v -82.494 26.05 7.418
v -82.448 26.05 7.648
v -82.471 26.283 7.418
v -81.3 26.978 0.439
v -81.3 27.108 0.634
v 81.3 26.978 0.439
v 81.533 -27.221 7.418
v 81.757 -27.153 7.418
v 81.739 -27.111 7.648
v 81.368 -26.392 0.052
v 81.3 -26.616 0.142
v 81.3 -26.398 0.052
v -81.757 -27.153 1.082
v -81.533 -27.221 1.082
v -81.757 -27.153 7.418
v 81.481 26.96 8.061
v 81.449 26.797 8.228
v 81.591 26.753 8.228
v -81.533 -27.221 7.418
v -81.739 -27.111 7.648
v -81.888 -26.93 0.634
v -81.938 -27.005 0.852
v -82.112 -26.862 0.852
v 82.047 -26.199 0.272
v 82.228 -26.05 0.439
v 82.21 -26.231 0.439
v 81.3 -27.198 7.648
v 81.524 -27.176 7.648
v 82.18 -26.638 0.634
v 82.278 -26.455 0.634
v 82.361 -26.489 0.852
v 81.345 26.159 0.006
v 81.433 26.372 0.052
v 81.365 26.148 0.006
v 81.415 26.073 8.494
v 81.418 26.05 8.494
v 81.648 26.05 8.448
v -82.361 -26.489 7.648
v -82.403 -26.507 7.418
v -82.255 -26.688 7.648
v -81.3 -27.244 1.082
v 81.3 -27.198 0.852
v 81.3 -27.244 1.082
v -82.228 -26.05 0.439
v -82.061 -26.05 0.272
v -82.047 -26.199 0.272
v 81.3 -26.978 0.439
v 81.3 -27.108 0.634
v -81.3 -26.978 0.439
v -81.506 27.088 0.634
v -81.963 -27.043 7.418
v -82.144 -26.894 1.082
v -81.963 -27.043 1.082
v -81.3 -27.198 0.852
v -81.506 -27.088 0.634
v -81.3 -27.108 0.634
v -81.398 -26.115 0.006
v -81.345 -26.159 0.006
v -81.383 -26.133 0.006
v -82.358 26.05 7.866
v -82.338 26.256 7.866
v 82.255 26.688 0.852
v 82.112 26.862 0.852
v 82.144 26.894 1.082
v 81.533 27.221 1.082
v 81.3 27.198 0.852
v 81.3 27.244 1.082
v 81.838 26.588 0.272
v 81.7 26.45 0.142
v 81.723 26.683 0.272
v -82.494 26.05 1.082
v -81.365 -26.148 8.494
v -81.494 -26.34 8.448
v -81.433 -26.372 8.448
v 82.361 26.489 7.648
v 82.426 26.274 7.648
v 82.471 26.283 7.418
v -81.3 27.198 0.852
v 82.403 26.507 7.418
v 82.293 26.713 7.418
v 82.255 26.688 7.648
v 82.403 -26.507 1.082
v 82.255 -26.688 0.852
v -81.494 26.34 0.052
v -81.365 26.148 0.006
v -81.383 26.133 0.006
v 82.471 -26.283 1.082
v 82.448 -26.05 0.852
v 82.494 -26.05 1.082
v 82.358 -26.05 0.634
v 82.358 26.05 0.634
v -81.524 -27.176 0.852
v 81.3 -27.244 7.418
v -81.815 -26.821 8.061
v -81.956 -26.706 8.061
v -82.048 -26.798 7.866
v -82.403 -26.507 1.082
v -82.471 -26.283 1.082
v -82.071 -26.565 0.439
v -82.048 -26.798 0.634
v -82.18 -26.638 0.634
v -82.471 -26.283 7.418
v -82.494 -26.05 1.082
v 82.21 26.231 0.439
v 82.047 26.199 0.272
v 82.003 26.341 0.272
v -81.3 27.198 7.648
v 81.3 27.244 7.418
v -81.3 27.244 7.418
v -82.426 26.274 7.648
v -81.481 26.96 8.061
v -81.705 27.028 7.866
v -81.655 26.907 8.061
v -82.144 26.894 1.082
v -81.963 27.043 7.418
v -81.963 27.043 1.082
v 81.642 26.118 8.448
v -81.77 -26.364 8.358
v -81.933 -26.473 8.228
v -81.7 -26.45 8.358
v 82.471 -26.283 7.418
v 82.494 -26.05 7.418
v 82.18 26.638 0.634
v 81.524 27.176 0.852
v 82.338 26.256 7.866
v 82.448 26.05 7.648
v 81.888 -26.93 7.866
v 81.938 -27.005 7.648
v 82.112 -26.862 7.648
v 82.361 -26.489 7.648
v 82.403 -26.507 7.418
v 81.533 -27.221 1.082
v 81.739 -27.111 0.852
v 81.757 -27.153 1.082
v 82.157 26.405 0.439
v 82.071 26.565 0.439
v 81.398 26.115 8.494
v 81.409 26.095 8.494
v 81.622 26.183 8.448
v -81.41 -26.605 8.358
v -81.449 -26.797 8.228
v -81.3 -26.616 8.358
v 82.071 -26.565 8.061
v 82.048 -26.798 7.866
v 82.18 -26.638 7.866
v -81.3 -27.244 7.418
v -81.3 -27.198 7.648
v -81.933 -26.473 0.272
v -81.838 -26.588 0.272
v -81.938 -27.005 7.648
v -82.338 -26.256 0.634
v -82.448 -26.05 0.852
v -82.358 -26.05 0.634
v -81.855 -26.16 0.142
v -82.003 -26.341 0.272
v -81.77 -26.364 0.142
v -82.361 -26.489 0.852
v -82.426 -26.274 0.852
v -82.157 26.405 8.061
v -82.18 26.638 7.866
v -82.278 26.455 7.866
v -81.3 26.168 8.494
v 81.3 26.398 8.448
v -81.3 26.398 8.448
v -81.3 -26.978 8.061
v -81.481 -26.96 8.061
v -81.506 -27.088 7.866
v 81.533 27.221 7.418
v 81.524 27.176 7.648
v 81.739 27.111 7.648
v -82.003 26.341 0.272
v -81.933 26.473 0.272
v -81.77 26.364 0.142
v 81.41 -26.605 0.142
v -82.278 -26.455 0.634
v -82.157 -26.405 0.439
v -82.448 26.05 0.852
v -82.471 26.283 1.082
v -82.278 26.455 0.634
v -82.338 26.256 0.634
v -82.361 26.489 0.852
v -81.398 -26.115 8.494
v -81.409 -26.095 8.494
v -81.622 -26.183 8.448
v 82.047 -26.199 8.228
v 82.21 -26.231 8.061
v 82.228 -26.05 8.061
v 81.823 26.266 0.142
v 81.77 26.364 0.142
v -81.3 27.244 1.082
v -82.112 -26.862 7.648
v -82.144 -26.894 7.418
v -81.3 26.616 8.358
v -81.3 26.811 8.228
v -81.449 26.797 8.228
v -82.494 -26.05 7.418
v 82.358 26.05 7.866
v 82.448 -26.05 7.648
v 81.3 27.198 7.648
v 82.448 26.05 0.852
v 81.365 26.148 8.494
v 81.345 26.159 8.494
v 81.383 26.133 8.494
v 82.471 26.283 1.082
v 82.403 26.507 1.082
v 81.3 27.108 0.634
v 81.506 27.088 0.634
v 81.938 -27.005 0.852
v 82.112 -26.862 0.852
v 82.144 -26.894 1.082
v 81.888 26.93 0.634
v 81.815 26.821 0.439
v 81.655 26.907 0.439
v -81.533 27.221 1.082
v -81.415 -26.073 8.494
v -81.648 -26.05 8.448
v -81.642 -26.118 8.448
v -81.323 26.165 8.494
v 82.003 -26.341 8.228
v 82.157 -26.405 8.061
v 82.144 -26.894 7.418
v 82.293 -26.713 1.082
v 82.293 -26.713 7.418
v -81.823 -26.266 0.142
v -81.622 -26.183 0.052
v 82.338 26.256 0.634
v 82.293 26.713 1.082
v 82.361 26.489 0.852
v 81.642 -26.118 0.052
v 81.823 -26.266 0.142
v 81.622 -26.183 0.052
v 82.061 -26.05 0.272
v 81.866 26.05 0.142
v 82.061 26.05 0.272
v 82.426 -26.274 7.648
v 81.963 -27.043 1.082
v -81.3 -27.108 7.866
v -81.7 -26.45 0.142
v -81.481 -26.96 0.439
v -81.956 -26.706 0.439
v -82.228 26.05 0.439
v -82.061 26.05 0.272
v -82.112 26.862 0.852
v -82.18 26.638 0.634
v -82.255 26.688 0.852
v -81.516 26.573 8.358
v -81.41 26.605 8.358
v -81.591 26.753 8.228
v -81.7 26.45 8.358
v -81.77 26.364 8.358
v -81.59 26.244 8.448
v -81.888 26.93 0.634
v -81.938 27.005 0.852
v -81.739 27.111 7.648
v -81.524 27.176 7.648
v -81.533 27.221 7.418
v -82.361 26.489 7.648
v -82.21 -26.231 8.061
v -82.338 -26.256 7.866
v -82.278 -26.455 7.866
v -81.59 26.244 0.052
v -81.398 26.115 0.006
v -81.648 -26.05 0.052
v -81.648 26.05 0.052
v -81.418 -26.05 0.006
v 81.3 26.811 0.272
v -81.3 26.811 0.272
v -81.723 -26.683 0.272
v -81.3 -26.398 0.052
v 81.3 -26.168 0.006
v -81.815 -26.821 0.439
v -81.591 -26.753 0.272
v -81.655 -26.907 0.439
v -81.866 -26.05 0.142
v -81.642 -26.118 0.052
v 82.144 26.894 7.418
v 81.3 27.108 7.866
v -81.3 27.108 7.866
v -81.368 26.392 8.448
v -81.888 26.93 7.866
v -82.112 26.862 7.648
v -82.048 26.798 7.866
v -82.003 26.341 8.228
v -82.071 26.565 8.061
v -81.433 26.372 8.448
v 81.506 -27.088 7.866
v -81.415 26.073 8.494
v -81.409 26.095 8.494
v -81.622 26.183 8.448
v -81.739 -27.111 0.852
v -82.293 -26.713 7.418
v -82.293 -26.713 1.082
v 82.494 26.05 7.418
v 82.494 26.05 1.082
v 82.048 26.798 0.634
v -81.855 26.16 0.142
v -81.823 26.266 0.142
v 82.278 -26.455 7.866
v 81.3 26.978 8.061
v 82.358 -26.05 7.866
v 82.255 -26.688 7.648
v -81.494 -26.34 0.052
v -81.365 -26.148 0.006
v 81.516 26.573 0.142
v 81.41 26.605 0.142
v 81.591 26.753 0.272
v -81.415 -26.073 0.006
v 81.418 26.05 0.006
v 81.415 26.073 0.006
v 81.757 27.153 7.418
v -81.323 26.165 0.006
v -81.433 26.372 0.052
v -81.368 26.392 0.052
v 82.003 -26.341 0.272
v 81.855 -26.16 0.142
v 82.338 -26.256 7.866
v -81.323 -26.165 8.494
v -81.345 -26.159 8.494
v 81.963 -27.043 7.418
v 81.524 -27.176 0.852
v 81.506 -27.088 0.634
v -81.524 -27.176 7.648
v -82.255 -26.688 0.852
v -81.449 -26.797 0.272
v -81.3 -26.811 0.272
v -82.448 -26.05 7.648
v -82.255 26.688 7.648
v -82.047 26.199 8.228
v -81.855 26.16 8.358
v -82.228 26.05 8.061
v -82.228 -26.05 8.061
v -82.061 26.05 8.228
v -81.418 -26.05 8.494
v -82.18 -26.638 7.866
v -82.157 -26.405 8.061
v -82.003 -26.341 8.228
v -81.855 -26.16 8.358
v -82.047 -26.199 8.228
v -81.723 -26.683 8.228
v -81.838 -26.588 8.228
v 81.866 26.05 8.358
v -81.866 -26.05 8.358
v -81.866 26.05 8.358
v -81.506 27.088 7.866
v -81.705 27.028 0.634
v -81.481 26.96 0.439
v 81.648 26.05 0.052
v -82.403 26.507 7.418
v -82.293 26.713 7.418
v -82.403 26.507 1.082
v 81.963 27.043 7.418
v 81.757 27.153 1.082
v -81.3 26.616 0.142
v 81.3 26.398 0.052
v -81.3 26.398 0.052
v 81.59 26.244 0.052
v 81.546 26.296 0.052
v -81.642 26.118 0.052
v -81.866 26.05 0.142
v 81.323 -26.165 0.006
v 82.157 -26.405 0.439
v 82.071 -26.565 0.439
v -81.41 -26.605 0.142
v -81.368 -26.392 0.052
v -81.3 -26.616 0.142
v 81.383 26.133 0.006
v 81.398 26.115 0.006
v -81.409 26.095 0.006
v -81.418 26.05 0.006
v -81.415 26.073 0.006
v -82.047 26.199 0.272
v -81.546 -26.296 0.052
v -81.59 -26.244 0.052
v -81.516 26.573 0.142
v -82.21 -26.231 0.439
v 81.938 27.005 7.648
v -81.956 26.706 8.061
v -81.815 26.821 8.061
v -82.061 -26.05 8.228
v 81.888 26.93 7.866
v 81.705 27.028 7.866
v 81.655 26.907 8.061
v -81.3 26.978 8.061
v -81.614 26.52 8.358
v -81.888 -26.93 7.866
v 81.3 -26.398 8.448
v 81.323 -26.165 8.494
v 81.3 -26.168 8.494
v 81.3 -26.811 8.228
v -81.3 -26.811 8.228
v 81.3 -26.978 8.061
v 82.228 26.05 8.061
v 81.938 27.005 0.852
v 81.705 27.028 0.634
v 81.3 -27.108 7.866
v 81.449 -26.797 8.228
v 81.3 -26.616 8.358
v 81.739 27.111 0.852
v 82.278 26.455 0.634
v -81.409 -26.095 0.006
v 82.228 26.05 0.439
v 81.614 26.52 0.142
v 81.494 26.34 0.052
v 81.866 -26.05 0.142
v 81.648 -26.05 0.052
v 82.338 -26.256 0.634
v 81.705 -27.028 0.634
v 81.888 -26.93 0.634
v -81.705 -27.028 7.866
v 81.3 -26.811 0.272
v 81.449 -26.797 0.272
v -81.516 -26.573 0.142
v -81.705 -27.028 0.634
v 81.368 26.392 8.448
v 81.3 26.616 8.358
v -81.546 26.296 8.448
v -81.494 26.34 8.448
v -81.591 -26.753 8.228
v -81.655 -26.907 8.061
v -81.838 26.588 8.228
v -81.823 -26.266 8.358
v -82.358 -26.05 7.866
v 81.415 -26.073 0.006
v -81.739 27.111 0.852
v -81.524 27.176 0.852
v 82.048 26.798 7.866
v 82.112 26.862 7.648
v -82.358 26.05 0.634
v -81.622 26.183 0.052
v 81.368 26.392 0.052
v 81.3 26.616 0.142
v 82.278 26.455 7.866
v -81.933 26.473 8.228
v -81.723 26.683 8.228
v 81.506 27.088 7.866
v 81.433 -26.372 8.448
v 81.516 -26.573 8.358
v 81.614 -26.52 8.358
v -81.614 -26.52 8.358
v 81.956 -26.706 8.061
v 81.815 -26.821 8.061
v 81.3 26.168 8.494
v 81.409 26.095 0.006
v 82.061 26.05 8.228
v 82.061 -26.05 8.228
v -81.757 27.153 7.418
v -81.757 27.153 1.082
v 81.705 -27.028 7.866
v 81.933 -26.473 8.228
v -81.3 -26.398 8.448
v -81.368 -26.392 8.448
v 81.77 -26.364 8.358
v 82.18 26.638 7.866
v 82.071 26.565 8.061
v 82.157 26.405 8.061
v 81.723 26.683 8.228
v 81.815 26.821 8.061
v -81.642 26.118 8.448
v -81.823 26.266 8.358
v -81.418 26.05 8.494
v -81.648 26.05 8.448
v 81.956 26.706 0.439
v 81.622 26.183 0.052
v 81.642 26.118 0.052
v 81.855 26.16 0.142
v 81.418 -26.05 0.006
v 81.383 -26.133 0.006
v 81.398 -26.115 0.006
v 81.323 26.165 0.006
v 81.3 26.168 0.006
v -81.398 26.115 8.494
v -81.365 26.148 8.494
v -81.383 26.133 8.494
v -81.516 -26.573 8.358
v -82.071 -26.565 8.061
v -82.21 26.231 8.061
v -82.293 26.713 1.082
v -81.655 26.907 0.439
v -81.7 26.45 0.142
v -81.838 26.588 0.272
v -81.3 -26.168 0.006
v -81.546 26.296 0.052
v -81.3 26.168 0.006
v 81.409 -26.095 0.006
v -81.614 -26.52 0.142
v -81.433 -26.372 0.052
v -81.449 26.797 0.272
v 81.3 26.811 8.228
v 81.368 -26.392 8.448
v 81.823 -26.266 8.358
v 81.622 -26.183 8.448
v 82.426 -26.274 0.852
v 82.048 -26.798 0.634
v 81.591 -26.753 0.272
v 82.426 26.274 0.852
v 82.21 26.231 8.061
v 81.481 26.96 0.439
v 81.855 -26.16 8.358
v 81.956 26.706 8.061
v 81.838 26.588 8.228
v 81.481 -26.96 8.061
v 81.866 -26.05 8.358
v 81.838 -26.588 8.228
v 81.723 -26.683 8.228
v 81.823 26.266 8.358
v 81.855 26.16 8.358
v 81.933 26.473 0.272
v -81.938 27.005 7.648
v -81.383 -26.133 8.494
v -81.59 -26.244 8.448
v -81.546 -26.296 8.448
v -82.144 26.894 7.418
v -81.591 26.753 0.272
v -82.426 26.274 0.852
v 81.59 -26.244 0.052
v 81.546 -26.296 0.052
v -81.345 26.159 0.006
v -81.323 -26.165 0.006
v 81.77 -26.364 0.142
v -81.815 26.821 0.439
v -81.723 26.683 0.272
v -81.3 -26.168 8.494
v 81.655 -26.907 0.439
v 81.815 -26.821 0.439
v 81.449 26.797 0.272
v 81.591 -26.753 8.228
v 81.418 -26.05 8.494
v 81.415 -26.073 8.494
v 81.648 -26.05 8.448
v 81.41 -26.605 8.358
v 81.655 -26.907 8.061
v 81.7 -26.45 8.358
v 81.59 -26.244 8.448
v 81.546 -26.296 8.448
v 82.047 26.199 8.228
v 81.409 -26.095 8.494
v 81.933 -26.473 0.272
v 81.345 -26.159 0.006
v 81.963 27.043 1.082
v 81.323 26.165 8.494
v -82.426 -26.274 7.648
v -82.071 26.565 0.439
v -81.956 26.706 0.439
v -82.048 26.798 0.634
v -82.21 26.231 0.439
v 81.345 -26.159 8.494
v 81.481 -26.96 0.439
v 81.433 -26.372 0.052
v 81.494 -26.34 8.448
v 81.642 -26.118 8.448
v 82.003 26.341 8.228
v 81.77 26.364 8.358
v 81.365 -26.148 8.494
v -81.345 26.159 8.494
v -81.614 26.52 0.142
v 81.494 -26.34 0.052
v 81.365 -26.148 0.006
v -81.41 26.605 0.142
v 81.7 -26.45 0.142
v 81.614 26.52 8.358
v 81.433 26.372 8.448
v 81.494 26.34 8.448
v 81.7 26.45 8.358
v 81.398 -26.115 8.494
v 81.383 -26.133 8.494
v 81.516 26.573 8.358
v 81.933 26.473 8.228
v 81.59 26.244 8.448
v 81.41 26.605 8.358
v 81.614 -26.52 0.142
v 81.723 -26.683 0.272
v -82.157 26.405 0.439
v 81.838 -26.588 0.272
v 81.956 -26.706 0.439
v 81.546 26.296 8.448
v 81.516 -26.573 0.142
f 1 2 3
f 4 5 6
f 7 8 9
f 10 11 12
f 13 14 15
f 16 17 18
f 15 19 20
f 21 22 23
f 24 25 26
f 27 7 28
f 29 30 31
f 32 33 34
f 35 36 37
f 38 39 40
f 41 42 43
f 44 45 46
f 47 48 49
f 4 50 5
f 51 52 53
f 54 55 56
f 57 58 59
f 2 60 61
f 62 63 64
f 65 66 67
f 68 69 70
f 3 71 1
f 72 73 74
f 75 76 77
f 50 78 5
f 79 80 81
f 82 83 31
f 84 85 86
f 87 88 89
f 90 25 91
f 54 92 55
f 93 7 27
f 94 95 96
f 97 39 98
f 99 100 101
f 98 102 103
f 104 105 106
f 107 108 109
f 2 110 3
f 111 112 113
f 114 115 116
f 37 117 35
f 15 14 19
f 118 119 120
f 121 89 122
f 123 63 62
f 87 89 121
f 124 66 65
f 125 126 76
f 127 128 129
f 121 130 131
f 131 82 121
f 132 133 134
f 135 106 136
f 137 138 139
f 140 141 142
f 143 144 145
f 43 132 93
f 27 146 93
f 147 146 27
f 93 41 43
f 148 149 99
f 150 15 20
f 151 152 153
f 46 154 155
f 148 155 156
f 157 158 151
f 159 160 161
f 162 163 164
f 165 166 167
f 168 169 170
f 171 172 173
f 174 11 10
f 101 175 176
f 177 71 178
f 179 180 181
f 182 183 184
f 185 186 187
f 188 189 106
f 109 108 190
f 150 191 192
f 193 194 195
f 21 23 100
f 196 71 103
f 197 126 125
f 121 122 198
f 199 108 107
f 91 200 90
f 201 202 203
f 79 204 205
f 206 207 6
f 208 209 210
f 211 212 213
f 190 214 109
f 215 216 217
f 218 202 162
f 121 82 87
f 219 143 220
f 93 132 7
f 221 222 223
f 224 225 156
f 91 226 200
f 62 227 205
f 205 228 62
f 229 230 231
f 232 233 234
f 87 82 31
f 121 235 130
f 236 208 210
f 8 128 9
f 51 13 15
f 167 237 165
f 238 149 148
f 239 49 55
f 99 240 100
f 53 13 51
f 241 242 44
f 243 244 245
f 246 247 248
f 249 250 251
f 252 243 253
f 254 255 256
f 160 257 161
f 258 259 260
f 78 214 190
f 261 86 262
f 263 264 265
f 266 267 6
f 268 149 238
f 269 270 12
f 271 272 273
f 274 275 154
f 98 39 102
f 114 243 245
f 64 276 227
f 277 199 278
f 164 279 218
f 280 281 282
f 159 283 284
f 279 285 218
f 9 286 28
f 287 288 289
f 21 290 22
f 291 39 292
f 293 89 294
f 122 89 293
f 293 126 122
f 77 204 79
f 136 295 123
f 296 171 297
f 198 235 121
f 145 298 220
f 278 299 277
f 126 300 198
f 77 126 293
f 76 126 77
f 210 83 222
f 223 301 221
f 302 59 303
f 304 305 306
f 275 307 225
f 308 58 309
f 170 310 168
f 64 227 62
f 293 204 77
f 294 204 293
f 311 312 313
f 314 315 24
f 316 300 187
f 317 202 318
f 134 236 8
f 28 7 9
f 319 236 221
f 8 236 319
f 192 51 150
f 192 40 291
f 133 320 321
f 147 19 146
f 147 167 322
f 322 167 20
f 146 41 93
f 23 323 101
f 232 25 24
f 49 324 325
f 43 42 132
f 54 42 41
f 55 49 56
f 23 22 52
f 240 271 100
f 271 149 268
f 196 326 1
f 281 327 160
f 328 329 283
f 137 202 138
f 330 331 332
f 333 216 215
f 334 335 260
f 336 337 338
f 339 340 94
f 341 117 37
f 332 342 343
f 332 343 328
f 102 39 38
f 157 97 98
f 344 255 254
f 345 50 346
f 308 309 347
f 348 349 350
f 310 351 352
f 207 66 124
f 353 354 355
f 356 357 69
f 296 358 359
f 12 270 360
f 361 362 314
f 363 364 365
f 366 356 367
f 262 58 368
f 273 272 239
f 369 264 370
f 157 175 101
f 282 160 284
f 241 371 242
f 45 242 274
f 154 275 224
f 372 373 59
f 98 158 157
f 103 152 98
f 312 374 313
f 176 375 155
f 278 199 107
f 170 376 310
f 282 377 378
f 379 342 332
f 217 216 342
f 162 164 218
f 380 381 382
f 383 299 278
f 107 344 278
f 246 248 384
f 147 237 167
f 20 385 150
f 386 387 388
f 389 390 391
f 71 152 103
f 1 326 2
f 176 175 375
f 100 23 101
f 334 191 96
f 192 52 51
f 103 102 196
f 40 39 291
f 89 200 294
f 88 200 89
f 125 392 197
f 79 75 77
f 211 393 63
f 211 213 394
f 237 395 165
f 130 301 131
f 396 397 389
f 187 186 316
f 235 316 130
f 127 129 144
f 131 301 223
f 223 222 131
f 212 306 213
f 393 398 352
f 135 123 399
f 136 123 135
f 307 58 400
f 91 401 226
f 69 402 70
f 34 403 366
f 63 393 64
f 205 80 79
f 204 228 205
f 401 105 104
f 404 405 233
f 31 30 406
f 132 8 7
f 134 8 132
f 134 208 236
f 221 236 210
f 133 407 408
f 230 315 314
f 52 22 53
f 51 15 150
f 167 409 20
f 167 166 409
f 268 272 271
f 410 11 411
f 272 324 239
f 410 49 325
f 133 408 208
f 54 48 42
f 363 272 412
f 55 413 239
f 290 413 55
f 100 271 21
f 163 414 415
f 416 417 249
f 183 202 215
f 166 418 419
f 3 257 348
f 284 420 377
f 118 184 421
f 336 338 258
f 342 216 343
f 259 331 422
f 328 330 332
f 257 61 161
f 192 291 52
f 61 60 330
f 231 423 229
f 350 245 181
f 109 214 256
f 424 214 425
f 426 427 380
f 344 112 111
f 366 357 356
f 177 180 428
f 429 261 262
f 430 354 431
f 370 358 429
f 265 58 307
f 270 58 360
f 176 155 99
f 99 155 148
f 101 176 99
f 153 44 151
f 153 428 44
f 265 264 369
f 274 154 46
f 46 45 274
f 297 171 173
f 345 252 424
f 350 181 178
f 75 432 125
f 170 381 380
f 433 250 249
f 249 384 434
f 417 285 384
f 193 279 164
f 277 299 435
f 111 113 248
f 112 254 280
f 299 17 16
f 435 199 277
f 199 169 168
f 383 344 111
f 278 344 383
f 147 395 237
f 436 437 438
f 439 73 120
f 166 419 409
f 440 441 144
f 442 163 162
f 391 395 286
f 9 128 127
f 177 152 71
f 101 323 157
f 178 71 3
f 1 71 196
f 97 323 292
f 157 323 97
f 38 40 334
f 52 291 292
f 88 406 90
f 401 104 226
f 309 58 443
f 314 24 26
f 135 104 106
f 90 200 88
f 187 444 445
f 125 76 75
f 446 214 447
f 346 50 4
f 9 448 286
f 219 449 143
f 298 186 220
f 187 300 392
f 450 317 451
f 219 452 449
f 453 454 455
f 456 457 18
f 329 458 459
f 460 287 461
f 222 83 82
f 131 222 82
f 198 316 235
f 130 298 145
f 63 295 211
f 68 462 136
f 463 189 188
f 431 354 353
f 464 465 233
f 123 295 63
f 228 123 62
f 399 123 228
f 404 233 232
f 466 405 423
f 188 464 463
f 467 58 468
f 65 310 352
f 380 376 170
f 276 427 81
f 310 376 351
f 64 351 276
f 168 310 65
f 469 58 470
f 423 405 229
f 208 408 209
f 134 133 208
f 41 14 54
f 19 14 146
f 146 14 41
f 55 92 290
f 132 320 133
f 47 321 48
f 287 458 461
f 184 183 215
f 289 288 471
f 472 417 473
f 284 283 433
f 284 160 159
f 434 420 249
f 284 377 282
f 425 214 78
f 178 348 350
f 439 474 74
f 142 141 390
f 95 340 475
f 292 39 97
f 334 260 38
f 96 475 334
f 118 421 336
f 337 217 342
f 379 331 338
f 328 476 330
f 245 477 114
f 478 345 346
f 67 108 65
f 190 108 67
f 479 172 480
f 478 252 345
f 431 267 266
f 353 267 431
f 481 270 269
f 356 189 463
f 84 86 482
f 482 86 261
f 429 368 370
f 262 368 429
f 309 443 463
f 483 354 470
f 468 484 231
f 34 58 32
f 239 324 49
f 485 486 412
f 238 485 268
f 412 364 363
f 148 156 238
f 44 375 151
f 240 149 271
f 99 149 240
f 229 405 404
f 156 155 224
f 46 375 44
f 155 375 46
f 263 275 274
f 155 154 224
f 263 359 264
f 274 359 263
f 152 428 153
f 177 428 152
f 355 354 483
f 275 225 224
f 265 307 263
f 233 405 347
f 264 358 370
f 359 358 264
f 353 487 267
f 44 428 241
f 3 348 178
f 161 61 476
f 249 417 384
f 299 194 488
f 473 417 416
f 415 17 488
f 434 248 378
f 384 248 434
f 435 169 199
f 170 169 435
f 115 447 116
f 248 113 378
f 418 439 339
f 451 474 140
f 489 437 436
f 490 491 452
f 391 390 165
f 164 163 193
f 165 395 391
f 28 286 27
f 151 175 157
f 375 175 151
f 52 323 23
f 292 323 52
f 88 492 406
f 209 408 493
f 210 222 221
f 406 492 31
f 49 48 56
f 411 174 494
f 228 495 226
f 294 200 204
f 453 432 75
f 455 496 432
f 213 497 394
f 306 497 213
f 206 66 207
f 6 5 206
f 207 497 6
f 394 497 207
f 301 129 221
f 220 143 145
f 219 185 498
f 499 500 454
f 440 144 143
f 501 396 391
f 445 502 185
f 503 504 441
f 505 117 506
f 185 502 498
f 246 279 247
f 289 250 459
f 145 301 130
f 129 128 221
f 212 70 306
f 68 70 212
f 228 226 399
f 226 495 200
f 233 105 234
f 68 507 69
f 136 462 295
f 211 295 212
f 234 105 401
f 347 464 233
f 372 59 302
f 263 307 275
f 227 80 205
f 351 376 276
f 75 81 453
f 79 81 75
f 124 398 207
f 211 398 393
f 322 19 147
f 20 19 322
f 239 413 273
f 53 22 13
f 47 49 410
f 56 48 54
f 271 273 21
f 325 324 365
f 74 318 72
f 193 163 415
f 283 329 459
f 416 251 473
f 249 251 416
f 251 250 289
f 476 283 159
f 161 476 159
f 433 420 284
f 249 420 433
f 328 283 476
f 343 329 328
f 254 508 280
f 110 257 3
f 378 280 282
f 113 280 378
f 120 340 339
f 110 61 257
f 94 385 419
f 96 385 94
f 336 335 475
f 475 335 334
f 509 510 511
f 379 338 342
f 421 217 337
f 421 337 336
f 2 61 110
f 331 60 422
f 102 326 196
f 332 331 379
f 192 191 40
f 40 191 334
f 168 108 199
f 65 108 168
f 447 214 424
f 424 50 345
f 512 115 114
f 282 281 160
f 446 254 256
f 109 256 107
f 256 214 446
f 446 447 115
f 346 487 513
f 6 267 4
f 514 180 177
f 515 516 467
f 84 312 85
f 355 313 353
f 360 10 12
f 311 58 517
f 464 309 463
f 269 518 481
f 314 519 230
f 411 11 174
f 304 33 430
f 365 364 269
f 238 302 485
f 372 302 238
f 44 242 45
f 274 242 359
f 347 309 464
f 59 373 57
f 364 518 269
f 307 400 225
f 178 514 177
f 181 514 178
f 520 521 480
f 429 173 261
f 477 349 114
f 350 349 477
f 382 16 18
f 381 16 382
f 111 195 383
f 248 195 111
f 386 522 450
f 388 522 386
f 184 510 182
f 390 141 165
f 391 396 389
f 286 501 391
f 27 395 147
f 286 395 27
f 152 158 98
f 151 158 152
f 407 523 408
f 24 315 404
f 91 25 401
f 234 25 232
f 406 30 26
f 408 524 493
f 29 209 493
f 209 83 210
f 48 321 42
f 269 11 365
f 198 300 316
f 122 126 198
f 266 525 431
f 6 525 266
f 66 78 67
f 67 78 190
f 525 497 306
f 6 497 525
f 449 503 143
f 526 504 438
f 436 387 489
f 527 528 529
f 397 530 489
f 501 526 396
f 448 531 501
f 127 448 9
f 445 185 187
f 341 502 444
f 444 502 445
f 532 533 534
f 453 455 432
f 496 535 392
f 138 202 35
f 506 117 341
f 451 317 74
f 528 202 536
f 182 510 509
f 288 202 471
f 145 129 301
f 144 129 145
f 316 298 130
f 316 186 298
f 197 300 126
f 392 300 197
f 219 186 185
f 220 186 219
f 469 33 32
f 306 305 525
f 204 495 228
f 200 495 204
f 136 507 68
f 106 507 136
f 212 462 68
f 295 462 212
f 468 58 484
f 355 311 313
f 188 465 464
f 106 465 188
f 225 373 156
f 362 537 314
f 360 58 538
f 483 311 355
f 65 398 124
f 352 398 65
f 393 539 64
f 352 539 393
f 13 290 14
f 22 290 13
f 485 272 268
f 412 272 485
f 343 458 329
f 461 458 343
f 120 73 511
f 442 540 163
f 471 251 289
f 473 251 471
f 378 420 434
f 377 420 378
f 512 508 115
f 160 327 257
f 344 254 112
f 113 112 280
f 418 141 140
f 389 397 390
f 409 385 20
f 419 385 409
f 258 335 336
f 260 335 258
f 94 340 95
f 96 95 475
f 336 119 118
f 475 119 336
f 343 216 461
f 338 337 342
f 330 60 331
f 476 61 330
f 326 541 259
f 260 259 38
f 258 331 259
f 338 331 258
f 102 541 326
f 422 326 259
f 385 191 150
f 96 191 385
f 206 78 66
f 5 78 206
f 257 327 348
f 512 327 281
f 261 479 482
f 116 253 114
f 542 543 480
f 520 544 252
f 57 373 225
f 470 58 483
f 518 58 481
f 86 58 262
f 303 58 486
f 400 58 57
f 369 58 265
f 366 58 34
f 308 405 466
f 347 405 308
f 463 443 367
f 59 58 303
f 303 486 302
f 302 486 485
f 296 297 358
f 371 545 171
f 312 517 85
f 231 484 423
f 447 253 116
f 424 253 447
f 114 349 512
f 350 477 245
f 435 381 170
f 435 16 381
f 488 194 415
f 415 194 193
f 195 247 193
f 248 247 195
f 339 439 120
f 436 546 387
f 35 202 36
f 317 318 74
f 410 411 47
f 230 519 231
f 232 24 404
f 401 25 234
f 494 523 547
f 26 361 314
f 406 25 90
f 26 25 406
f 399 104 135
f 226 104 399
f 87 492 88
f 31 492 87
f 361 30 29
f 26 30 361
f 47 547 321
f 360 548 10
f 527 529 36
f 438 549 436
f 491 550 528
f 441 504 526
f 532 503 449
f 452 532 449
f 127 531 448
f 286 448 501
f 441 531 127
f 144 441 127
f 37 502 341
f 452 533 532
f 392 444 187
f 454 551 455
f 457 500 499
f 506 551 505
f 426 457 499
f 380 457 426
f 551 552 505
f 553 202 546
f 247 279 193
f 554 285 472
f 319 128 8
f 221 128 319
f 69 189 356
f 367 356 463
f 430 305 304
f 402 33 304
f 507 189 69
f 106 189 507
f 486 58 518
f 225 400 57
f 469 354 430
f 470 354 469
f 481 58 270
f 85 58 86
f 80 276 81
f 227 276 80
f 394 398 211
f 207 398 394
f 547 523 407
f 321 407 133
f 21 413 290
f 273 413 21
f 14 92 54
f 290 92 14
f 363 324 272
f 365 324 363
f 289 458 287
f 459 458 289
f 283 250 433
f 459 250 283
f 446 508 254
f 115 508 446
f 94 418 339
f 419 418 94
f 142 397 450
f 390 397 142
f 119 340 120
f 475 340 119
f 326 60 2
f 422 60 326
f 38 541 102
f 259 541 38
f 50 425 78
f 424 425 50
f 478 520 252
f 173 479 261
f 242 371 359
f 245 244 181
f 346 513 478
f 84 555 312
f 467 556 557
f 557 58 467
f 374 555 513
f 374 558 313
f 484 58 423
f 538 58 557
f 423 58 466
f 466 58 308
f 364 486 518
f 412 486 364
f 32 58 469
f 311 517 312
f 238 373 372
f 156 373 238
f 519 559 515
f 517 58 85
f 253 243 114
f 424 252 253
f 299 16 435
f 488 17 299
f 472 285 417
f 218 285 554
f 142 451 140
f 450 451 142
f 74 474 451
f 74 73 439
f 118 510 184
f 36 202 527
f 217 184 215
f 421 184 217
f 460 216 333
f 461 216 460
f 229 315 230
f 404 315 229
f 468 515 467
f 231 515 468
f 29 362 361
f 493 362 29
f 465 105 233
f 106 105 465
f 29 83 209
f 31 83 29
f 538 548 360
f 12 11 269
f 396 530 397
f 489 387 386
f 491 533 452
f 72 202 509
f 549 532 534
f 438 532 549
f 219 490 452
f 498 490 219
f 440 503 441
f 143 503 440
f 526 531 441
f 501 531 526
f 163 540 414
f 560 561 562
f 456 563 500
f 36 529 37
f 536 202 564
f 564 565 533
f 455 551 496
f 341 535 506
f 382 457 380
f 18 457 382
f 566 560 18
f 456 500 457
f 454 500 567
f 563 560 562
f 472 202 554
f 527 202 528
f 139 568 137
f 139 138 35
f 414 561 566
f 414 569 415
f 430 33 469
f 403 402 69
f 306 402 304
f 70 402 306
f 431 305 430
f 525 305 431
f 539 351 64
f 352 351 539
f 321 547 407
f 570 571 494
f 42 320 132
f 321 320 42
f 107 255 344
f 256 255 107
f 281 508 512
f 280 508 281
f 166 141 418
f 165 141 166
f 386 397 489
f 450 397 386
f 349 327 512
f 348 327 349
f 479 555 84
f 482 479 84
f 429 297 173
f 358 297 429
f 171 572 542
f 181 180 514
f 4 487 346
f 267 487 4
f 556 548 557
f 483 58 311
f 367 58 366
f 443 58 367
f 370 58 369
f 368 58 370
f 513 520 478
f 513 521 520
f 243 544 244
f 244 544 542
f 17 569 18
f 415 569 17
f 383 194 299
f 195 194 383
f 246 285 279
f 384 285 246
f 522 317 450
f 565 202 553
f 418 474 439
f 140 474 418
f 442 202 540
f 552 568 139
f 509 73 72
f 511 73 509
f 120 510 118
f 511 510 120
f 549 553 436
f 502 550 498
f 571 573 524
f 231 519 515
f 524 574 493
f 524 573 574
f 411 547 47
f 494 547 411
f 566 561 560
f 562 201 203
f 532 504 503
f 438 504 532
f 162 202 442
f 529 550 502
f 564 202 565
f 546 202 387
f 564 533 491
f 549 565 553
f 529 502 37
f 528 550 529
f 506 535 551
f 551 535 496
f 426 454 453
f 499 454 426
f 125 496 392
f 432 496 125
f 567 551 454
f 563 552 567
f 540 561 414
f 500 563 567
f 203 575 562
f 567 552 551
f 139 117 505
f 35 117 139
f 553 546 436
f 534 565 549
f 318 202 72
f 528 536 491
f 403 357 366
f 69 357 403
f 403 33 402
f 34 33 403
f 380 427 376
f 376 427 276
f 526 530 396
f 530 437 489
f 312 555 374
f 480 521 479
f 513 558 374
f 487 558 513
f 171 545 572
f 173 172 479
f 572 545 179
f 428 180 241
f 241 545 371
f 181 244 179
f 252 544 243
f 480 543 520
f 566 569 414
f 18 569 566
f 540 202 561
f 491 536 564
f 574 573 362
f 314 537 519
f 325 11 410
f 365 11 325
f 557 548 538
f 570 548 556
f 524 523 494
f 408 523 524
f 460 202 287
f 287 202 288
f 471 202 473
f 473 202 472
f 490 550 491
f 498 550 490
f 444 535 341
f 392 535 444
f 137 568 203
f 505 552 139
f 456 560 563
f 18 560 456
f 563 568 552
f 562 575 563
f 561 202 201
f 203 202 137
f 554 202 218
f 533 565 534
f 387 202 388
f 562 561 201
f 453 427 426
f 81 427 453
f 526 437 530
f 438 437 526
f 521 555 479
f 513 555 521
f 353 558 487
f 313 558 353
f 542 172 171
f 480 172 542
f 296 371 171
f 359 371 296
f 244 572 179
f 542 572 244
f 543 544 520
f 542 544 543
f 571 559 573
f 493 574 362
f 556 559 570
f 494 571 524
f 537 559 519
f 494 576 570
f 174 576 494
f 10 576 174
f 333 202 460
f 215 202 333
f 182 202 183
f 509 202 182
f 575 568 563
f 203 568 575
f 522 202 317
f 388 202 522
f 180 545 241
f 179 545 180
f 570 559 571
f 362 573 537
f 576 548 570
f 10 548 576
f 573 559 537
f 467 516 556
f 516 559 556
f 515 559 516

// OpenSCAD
// Breadboard 830 (全尺寸麵包板（830 孔）) visual source for NexCAD.
// Units: millimeters. Origin: part bottom-center, matching src/parts/library.ts.
// This generated baseline is intentionally simple; refine it with measured details before exporting STL.

$fn = 32;

module rounded_box(size, r = 0.8) {
  hull() {
    for (x = [-size[0] / 2 + r, size[0] / 2 - r])
      for (y = [-size[1] / 2 + r, size[1] / 2 - r]) {
        translate([x, y, r]) sphere(r = r);
        translate([x, y, size[2] - r]) sphere(r = r);
      }
  }
}

color("#2e7d5b") rounded_box([165, 54.5, 8.5], min(1.2, min(165, 54.5) / 8));
